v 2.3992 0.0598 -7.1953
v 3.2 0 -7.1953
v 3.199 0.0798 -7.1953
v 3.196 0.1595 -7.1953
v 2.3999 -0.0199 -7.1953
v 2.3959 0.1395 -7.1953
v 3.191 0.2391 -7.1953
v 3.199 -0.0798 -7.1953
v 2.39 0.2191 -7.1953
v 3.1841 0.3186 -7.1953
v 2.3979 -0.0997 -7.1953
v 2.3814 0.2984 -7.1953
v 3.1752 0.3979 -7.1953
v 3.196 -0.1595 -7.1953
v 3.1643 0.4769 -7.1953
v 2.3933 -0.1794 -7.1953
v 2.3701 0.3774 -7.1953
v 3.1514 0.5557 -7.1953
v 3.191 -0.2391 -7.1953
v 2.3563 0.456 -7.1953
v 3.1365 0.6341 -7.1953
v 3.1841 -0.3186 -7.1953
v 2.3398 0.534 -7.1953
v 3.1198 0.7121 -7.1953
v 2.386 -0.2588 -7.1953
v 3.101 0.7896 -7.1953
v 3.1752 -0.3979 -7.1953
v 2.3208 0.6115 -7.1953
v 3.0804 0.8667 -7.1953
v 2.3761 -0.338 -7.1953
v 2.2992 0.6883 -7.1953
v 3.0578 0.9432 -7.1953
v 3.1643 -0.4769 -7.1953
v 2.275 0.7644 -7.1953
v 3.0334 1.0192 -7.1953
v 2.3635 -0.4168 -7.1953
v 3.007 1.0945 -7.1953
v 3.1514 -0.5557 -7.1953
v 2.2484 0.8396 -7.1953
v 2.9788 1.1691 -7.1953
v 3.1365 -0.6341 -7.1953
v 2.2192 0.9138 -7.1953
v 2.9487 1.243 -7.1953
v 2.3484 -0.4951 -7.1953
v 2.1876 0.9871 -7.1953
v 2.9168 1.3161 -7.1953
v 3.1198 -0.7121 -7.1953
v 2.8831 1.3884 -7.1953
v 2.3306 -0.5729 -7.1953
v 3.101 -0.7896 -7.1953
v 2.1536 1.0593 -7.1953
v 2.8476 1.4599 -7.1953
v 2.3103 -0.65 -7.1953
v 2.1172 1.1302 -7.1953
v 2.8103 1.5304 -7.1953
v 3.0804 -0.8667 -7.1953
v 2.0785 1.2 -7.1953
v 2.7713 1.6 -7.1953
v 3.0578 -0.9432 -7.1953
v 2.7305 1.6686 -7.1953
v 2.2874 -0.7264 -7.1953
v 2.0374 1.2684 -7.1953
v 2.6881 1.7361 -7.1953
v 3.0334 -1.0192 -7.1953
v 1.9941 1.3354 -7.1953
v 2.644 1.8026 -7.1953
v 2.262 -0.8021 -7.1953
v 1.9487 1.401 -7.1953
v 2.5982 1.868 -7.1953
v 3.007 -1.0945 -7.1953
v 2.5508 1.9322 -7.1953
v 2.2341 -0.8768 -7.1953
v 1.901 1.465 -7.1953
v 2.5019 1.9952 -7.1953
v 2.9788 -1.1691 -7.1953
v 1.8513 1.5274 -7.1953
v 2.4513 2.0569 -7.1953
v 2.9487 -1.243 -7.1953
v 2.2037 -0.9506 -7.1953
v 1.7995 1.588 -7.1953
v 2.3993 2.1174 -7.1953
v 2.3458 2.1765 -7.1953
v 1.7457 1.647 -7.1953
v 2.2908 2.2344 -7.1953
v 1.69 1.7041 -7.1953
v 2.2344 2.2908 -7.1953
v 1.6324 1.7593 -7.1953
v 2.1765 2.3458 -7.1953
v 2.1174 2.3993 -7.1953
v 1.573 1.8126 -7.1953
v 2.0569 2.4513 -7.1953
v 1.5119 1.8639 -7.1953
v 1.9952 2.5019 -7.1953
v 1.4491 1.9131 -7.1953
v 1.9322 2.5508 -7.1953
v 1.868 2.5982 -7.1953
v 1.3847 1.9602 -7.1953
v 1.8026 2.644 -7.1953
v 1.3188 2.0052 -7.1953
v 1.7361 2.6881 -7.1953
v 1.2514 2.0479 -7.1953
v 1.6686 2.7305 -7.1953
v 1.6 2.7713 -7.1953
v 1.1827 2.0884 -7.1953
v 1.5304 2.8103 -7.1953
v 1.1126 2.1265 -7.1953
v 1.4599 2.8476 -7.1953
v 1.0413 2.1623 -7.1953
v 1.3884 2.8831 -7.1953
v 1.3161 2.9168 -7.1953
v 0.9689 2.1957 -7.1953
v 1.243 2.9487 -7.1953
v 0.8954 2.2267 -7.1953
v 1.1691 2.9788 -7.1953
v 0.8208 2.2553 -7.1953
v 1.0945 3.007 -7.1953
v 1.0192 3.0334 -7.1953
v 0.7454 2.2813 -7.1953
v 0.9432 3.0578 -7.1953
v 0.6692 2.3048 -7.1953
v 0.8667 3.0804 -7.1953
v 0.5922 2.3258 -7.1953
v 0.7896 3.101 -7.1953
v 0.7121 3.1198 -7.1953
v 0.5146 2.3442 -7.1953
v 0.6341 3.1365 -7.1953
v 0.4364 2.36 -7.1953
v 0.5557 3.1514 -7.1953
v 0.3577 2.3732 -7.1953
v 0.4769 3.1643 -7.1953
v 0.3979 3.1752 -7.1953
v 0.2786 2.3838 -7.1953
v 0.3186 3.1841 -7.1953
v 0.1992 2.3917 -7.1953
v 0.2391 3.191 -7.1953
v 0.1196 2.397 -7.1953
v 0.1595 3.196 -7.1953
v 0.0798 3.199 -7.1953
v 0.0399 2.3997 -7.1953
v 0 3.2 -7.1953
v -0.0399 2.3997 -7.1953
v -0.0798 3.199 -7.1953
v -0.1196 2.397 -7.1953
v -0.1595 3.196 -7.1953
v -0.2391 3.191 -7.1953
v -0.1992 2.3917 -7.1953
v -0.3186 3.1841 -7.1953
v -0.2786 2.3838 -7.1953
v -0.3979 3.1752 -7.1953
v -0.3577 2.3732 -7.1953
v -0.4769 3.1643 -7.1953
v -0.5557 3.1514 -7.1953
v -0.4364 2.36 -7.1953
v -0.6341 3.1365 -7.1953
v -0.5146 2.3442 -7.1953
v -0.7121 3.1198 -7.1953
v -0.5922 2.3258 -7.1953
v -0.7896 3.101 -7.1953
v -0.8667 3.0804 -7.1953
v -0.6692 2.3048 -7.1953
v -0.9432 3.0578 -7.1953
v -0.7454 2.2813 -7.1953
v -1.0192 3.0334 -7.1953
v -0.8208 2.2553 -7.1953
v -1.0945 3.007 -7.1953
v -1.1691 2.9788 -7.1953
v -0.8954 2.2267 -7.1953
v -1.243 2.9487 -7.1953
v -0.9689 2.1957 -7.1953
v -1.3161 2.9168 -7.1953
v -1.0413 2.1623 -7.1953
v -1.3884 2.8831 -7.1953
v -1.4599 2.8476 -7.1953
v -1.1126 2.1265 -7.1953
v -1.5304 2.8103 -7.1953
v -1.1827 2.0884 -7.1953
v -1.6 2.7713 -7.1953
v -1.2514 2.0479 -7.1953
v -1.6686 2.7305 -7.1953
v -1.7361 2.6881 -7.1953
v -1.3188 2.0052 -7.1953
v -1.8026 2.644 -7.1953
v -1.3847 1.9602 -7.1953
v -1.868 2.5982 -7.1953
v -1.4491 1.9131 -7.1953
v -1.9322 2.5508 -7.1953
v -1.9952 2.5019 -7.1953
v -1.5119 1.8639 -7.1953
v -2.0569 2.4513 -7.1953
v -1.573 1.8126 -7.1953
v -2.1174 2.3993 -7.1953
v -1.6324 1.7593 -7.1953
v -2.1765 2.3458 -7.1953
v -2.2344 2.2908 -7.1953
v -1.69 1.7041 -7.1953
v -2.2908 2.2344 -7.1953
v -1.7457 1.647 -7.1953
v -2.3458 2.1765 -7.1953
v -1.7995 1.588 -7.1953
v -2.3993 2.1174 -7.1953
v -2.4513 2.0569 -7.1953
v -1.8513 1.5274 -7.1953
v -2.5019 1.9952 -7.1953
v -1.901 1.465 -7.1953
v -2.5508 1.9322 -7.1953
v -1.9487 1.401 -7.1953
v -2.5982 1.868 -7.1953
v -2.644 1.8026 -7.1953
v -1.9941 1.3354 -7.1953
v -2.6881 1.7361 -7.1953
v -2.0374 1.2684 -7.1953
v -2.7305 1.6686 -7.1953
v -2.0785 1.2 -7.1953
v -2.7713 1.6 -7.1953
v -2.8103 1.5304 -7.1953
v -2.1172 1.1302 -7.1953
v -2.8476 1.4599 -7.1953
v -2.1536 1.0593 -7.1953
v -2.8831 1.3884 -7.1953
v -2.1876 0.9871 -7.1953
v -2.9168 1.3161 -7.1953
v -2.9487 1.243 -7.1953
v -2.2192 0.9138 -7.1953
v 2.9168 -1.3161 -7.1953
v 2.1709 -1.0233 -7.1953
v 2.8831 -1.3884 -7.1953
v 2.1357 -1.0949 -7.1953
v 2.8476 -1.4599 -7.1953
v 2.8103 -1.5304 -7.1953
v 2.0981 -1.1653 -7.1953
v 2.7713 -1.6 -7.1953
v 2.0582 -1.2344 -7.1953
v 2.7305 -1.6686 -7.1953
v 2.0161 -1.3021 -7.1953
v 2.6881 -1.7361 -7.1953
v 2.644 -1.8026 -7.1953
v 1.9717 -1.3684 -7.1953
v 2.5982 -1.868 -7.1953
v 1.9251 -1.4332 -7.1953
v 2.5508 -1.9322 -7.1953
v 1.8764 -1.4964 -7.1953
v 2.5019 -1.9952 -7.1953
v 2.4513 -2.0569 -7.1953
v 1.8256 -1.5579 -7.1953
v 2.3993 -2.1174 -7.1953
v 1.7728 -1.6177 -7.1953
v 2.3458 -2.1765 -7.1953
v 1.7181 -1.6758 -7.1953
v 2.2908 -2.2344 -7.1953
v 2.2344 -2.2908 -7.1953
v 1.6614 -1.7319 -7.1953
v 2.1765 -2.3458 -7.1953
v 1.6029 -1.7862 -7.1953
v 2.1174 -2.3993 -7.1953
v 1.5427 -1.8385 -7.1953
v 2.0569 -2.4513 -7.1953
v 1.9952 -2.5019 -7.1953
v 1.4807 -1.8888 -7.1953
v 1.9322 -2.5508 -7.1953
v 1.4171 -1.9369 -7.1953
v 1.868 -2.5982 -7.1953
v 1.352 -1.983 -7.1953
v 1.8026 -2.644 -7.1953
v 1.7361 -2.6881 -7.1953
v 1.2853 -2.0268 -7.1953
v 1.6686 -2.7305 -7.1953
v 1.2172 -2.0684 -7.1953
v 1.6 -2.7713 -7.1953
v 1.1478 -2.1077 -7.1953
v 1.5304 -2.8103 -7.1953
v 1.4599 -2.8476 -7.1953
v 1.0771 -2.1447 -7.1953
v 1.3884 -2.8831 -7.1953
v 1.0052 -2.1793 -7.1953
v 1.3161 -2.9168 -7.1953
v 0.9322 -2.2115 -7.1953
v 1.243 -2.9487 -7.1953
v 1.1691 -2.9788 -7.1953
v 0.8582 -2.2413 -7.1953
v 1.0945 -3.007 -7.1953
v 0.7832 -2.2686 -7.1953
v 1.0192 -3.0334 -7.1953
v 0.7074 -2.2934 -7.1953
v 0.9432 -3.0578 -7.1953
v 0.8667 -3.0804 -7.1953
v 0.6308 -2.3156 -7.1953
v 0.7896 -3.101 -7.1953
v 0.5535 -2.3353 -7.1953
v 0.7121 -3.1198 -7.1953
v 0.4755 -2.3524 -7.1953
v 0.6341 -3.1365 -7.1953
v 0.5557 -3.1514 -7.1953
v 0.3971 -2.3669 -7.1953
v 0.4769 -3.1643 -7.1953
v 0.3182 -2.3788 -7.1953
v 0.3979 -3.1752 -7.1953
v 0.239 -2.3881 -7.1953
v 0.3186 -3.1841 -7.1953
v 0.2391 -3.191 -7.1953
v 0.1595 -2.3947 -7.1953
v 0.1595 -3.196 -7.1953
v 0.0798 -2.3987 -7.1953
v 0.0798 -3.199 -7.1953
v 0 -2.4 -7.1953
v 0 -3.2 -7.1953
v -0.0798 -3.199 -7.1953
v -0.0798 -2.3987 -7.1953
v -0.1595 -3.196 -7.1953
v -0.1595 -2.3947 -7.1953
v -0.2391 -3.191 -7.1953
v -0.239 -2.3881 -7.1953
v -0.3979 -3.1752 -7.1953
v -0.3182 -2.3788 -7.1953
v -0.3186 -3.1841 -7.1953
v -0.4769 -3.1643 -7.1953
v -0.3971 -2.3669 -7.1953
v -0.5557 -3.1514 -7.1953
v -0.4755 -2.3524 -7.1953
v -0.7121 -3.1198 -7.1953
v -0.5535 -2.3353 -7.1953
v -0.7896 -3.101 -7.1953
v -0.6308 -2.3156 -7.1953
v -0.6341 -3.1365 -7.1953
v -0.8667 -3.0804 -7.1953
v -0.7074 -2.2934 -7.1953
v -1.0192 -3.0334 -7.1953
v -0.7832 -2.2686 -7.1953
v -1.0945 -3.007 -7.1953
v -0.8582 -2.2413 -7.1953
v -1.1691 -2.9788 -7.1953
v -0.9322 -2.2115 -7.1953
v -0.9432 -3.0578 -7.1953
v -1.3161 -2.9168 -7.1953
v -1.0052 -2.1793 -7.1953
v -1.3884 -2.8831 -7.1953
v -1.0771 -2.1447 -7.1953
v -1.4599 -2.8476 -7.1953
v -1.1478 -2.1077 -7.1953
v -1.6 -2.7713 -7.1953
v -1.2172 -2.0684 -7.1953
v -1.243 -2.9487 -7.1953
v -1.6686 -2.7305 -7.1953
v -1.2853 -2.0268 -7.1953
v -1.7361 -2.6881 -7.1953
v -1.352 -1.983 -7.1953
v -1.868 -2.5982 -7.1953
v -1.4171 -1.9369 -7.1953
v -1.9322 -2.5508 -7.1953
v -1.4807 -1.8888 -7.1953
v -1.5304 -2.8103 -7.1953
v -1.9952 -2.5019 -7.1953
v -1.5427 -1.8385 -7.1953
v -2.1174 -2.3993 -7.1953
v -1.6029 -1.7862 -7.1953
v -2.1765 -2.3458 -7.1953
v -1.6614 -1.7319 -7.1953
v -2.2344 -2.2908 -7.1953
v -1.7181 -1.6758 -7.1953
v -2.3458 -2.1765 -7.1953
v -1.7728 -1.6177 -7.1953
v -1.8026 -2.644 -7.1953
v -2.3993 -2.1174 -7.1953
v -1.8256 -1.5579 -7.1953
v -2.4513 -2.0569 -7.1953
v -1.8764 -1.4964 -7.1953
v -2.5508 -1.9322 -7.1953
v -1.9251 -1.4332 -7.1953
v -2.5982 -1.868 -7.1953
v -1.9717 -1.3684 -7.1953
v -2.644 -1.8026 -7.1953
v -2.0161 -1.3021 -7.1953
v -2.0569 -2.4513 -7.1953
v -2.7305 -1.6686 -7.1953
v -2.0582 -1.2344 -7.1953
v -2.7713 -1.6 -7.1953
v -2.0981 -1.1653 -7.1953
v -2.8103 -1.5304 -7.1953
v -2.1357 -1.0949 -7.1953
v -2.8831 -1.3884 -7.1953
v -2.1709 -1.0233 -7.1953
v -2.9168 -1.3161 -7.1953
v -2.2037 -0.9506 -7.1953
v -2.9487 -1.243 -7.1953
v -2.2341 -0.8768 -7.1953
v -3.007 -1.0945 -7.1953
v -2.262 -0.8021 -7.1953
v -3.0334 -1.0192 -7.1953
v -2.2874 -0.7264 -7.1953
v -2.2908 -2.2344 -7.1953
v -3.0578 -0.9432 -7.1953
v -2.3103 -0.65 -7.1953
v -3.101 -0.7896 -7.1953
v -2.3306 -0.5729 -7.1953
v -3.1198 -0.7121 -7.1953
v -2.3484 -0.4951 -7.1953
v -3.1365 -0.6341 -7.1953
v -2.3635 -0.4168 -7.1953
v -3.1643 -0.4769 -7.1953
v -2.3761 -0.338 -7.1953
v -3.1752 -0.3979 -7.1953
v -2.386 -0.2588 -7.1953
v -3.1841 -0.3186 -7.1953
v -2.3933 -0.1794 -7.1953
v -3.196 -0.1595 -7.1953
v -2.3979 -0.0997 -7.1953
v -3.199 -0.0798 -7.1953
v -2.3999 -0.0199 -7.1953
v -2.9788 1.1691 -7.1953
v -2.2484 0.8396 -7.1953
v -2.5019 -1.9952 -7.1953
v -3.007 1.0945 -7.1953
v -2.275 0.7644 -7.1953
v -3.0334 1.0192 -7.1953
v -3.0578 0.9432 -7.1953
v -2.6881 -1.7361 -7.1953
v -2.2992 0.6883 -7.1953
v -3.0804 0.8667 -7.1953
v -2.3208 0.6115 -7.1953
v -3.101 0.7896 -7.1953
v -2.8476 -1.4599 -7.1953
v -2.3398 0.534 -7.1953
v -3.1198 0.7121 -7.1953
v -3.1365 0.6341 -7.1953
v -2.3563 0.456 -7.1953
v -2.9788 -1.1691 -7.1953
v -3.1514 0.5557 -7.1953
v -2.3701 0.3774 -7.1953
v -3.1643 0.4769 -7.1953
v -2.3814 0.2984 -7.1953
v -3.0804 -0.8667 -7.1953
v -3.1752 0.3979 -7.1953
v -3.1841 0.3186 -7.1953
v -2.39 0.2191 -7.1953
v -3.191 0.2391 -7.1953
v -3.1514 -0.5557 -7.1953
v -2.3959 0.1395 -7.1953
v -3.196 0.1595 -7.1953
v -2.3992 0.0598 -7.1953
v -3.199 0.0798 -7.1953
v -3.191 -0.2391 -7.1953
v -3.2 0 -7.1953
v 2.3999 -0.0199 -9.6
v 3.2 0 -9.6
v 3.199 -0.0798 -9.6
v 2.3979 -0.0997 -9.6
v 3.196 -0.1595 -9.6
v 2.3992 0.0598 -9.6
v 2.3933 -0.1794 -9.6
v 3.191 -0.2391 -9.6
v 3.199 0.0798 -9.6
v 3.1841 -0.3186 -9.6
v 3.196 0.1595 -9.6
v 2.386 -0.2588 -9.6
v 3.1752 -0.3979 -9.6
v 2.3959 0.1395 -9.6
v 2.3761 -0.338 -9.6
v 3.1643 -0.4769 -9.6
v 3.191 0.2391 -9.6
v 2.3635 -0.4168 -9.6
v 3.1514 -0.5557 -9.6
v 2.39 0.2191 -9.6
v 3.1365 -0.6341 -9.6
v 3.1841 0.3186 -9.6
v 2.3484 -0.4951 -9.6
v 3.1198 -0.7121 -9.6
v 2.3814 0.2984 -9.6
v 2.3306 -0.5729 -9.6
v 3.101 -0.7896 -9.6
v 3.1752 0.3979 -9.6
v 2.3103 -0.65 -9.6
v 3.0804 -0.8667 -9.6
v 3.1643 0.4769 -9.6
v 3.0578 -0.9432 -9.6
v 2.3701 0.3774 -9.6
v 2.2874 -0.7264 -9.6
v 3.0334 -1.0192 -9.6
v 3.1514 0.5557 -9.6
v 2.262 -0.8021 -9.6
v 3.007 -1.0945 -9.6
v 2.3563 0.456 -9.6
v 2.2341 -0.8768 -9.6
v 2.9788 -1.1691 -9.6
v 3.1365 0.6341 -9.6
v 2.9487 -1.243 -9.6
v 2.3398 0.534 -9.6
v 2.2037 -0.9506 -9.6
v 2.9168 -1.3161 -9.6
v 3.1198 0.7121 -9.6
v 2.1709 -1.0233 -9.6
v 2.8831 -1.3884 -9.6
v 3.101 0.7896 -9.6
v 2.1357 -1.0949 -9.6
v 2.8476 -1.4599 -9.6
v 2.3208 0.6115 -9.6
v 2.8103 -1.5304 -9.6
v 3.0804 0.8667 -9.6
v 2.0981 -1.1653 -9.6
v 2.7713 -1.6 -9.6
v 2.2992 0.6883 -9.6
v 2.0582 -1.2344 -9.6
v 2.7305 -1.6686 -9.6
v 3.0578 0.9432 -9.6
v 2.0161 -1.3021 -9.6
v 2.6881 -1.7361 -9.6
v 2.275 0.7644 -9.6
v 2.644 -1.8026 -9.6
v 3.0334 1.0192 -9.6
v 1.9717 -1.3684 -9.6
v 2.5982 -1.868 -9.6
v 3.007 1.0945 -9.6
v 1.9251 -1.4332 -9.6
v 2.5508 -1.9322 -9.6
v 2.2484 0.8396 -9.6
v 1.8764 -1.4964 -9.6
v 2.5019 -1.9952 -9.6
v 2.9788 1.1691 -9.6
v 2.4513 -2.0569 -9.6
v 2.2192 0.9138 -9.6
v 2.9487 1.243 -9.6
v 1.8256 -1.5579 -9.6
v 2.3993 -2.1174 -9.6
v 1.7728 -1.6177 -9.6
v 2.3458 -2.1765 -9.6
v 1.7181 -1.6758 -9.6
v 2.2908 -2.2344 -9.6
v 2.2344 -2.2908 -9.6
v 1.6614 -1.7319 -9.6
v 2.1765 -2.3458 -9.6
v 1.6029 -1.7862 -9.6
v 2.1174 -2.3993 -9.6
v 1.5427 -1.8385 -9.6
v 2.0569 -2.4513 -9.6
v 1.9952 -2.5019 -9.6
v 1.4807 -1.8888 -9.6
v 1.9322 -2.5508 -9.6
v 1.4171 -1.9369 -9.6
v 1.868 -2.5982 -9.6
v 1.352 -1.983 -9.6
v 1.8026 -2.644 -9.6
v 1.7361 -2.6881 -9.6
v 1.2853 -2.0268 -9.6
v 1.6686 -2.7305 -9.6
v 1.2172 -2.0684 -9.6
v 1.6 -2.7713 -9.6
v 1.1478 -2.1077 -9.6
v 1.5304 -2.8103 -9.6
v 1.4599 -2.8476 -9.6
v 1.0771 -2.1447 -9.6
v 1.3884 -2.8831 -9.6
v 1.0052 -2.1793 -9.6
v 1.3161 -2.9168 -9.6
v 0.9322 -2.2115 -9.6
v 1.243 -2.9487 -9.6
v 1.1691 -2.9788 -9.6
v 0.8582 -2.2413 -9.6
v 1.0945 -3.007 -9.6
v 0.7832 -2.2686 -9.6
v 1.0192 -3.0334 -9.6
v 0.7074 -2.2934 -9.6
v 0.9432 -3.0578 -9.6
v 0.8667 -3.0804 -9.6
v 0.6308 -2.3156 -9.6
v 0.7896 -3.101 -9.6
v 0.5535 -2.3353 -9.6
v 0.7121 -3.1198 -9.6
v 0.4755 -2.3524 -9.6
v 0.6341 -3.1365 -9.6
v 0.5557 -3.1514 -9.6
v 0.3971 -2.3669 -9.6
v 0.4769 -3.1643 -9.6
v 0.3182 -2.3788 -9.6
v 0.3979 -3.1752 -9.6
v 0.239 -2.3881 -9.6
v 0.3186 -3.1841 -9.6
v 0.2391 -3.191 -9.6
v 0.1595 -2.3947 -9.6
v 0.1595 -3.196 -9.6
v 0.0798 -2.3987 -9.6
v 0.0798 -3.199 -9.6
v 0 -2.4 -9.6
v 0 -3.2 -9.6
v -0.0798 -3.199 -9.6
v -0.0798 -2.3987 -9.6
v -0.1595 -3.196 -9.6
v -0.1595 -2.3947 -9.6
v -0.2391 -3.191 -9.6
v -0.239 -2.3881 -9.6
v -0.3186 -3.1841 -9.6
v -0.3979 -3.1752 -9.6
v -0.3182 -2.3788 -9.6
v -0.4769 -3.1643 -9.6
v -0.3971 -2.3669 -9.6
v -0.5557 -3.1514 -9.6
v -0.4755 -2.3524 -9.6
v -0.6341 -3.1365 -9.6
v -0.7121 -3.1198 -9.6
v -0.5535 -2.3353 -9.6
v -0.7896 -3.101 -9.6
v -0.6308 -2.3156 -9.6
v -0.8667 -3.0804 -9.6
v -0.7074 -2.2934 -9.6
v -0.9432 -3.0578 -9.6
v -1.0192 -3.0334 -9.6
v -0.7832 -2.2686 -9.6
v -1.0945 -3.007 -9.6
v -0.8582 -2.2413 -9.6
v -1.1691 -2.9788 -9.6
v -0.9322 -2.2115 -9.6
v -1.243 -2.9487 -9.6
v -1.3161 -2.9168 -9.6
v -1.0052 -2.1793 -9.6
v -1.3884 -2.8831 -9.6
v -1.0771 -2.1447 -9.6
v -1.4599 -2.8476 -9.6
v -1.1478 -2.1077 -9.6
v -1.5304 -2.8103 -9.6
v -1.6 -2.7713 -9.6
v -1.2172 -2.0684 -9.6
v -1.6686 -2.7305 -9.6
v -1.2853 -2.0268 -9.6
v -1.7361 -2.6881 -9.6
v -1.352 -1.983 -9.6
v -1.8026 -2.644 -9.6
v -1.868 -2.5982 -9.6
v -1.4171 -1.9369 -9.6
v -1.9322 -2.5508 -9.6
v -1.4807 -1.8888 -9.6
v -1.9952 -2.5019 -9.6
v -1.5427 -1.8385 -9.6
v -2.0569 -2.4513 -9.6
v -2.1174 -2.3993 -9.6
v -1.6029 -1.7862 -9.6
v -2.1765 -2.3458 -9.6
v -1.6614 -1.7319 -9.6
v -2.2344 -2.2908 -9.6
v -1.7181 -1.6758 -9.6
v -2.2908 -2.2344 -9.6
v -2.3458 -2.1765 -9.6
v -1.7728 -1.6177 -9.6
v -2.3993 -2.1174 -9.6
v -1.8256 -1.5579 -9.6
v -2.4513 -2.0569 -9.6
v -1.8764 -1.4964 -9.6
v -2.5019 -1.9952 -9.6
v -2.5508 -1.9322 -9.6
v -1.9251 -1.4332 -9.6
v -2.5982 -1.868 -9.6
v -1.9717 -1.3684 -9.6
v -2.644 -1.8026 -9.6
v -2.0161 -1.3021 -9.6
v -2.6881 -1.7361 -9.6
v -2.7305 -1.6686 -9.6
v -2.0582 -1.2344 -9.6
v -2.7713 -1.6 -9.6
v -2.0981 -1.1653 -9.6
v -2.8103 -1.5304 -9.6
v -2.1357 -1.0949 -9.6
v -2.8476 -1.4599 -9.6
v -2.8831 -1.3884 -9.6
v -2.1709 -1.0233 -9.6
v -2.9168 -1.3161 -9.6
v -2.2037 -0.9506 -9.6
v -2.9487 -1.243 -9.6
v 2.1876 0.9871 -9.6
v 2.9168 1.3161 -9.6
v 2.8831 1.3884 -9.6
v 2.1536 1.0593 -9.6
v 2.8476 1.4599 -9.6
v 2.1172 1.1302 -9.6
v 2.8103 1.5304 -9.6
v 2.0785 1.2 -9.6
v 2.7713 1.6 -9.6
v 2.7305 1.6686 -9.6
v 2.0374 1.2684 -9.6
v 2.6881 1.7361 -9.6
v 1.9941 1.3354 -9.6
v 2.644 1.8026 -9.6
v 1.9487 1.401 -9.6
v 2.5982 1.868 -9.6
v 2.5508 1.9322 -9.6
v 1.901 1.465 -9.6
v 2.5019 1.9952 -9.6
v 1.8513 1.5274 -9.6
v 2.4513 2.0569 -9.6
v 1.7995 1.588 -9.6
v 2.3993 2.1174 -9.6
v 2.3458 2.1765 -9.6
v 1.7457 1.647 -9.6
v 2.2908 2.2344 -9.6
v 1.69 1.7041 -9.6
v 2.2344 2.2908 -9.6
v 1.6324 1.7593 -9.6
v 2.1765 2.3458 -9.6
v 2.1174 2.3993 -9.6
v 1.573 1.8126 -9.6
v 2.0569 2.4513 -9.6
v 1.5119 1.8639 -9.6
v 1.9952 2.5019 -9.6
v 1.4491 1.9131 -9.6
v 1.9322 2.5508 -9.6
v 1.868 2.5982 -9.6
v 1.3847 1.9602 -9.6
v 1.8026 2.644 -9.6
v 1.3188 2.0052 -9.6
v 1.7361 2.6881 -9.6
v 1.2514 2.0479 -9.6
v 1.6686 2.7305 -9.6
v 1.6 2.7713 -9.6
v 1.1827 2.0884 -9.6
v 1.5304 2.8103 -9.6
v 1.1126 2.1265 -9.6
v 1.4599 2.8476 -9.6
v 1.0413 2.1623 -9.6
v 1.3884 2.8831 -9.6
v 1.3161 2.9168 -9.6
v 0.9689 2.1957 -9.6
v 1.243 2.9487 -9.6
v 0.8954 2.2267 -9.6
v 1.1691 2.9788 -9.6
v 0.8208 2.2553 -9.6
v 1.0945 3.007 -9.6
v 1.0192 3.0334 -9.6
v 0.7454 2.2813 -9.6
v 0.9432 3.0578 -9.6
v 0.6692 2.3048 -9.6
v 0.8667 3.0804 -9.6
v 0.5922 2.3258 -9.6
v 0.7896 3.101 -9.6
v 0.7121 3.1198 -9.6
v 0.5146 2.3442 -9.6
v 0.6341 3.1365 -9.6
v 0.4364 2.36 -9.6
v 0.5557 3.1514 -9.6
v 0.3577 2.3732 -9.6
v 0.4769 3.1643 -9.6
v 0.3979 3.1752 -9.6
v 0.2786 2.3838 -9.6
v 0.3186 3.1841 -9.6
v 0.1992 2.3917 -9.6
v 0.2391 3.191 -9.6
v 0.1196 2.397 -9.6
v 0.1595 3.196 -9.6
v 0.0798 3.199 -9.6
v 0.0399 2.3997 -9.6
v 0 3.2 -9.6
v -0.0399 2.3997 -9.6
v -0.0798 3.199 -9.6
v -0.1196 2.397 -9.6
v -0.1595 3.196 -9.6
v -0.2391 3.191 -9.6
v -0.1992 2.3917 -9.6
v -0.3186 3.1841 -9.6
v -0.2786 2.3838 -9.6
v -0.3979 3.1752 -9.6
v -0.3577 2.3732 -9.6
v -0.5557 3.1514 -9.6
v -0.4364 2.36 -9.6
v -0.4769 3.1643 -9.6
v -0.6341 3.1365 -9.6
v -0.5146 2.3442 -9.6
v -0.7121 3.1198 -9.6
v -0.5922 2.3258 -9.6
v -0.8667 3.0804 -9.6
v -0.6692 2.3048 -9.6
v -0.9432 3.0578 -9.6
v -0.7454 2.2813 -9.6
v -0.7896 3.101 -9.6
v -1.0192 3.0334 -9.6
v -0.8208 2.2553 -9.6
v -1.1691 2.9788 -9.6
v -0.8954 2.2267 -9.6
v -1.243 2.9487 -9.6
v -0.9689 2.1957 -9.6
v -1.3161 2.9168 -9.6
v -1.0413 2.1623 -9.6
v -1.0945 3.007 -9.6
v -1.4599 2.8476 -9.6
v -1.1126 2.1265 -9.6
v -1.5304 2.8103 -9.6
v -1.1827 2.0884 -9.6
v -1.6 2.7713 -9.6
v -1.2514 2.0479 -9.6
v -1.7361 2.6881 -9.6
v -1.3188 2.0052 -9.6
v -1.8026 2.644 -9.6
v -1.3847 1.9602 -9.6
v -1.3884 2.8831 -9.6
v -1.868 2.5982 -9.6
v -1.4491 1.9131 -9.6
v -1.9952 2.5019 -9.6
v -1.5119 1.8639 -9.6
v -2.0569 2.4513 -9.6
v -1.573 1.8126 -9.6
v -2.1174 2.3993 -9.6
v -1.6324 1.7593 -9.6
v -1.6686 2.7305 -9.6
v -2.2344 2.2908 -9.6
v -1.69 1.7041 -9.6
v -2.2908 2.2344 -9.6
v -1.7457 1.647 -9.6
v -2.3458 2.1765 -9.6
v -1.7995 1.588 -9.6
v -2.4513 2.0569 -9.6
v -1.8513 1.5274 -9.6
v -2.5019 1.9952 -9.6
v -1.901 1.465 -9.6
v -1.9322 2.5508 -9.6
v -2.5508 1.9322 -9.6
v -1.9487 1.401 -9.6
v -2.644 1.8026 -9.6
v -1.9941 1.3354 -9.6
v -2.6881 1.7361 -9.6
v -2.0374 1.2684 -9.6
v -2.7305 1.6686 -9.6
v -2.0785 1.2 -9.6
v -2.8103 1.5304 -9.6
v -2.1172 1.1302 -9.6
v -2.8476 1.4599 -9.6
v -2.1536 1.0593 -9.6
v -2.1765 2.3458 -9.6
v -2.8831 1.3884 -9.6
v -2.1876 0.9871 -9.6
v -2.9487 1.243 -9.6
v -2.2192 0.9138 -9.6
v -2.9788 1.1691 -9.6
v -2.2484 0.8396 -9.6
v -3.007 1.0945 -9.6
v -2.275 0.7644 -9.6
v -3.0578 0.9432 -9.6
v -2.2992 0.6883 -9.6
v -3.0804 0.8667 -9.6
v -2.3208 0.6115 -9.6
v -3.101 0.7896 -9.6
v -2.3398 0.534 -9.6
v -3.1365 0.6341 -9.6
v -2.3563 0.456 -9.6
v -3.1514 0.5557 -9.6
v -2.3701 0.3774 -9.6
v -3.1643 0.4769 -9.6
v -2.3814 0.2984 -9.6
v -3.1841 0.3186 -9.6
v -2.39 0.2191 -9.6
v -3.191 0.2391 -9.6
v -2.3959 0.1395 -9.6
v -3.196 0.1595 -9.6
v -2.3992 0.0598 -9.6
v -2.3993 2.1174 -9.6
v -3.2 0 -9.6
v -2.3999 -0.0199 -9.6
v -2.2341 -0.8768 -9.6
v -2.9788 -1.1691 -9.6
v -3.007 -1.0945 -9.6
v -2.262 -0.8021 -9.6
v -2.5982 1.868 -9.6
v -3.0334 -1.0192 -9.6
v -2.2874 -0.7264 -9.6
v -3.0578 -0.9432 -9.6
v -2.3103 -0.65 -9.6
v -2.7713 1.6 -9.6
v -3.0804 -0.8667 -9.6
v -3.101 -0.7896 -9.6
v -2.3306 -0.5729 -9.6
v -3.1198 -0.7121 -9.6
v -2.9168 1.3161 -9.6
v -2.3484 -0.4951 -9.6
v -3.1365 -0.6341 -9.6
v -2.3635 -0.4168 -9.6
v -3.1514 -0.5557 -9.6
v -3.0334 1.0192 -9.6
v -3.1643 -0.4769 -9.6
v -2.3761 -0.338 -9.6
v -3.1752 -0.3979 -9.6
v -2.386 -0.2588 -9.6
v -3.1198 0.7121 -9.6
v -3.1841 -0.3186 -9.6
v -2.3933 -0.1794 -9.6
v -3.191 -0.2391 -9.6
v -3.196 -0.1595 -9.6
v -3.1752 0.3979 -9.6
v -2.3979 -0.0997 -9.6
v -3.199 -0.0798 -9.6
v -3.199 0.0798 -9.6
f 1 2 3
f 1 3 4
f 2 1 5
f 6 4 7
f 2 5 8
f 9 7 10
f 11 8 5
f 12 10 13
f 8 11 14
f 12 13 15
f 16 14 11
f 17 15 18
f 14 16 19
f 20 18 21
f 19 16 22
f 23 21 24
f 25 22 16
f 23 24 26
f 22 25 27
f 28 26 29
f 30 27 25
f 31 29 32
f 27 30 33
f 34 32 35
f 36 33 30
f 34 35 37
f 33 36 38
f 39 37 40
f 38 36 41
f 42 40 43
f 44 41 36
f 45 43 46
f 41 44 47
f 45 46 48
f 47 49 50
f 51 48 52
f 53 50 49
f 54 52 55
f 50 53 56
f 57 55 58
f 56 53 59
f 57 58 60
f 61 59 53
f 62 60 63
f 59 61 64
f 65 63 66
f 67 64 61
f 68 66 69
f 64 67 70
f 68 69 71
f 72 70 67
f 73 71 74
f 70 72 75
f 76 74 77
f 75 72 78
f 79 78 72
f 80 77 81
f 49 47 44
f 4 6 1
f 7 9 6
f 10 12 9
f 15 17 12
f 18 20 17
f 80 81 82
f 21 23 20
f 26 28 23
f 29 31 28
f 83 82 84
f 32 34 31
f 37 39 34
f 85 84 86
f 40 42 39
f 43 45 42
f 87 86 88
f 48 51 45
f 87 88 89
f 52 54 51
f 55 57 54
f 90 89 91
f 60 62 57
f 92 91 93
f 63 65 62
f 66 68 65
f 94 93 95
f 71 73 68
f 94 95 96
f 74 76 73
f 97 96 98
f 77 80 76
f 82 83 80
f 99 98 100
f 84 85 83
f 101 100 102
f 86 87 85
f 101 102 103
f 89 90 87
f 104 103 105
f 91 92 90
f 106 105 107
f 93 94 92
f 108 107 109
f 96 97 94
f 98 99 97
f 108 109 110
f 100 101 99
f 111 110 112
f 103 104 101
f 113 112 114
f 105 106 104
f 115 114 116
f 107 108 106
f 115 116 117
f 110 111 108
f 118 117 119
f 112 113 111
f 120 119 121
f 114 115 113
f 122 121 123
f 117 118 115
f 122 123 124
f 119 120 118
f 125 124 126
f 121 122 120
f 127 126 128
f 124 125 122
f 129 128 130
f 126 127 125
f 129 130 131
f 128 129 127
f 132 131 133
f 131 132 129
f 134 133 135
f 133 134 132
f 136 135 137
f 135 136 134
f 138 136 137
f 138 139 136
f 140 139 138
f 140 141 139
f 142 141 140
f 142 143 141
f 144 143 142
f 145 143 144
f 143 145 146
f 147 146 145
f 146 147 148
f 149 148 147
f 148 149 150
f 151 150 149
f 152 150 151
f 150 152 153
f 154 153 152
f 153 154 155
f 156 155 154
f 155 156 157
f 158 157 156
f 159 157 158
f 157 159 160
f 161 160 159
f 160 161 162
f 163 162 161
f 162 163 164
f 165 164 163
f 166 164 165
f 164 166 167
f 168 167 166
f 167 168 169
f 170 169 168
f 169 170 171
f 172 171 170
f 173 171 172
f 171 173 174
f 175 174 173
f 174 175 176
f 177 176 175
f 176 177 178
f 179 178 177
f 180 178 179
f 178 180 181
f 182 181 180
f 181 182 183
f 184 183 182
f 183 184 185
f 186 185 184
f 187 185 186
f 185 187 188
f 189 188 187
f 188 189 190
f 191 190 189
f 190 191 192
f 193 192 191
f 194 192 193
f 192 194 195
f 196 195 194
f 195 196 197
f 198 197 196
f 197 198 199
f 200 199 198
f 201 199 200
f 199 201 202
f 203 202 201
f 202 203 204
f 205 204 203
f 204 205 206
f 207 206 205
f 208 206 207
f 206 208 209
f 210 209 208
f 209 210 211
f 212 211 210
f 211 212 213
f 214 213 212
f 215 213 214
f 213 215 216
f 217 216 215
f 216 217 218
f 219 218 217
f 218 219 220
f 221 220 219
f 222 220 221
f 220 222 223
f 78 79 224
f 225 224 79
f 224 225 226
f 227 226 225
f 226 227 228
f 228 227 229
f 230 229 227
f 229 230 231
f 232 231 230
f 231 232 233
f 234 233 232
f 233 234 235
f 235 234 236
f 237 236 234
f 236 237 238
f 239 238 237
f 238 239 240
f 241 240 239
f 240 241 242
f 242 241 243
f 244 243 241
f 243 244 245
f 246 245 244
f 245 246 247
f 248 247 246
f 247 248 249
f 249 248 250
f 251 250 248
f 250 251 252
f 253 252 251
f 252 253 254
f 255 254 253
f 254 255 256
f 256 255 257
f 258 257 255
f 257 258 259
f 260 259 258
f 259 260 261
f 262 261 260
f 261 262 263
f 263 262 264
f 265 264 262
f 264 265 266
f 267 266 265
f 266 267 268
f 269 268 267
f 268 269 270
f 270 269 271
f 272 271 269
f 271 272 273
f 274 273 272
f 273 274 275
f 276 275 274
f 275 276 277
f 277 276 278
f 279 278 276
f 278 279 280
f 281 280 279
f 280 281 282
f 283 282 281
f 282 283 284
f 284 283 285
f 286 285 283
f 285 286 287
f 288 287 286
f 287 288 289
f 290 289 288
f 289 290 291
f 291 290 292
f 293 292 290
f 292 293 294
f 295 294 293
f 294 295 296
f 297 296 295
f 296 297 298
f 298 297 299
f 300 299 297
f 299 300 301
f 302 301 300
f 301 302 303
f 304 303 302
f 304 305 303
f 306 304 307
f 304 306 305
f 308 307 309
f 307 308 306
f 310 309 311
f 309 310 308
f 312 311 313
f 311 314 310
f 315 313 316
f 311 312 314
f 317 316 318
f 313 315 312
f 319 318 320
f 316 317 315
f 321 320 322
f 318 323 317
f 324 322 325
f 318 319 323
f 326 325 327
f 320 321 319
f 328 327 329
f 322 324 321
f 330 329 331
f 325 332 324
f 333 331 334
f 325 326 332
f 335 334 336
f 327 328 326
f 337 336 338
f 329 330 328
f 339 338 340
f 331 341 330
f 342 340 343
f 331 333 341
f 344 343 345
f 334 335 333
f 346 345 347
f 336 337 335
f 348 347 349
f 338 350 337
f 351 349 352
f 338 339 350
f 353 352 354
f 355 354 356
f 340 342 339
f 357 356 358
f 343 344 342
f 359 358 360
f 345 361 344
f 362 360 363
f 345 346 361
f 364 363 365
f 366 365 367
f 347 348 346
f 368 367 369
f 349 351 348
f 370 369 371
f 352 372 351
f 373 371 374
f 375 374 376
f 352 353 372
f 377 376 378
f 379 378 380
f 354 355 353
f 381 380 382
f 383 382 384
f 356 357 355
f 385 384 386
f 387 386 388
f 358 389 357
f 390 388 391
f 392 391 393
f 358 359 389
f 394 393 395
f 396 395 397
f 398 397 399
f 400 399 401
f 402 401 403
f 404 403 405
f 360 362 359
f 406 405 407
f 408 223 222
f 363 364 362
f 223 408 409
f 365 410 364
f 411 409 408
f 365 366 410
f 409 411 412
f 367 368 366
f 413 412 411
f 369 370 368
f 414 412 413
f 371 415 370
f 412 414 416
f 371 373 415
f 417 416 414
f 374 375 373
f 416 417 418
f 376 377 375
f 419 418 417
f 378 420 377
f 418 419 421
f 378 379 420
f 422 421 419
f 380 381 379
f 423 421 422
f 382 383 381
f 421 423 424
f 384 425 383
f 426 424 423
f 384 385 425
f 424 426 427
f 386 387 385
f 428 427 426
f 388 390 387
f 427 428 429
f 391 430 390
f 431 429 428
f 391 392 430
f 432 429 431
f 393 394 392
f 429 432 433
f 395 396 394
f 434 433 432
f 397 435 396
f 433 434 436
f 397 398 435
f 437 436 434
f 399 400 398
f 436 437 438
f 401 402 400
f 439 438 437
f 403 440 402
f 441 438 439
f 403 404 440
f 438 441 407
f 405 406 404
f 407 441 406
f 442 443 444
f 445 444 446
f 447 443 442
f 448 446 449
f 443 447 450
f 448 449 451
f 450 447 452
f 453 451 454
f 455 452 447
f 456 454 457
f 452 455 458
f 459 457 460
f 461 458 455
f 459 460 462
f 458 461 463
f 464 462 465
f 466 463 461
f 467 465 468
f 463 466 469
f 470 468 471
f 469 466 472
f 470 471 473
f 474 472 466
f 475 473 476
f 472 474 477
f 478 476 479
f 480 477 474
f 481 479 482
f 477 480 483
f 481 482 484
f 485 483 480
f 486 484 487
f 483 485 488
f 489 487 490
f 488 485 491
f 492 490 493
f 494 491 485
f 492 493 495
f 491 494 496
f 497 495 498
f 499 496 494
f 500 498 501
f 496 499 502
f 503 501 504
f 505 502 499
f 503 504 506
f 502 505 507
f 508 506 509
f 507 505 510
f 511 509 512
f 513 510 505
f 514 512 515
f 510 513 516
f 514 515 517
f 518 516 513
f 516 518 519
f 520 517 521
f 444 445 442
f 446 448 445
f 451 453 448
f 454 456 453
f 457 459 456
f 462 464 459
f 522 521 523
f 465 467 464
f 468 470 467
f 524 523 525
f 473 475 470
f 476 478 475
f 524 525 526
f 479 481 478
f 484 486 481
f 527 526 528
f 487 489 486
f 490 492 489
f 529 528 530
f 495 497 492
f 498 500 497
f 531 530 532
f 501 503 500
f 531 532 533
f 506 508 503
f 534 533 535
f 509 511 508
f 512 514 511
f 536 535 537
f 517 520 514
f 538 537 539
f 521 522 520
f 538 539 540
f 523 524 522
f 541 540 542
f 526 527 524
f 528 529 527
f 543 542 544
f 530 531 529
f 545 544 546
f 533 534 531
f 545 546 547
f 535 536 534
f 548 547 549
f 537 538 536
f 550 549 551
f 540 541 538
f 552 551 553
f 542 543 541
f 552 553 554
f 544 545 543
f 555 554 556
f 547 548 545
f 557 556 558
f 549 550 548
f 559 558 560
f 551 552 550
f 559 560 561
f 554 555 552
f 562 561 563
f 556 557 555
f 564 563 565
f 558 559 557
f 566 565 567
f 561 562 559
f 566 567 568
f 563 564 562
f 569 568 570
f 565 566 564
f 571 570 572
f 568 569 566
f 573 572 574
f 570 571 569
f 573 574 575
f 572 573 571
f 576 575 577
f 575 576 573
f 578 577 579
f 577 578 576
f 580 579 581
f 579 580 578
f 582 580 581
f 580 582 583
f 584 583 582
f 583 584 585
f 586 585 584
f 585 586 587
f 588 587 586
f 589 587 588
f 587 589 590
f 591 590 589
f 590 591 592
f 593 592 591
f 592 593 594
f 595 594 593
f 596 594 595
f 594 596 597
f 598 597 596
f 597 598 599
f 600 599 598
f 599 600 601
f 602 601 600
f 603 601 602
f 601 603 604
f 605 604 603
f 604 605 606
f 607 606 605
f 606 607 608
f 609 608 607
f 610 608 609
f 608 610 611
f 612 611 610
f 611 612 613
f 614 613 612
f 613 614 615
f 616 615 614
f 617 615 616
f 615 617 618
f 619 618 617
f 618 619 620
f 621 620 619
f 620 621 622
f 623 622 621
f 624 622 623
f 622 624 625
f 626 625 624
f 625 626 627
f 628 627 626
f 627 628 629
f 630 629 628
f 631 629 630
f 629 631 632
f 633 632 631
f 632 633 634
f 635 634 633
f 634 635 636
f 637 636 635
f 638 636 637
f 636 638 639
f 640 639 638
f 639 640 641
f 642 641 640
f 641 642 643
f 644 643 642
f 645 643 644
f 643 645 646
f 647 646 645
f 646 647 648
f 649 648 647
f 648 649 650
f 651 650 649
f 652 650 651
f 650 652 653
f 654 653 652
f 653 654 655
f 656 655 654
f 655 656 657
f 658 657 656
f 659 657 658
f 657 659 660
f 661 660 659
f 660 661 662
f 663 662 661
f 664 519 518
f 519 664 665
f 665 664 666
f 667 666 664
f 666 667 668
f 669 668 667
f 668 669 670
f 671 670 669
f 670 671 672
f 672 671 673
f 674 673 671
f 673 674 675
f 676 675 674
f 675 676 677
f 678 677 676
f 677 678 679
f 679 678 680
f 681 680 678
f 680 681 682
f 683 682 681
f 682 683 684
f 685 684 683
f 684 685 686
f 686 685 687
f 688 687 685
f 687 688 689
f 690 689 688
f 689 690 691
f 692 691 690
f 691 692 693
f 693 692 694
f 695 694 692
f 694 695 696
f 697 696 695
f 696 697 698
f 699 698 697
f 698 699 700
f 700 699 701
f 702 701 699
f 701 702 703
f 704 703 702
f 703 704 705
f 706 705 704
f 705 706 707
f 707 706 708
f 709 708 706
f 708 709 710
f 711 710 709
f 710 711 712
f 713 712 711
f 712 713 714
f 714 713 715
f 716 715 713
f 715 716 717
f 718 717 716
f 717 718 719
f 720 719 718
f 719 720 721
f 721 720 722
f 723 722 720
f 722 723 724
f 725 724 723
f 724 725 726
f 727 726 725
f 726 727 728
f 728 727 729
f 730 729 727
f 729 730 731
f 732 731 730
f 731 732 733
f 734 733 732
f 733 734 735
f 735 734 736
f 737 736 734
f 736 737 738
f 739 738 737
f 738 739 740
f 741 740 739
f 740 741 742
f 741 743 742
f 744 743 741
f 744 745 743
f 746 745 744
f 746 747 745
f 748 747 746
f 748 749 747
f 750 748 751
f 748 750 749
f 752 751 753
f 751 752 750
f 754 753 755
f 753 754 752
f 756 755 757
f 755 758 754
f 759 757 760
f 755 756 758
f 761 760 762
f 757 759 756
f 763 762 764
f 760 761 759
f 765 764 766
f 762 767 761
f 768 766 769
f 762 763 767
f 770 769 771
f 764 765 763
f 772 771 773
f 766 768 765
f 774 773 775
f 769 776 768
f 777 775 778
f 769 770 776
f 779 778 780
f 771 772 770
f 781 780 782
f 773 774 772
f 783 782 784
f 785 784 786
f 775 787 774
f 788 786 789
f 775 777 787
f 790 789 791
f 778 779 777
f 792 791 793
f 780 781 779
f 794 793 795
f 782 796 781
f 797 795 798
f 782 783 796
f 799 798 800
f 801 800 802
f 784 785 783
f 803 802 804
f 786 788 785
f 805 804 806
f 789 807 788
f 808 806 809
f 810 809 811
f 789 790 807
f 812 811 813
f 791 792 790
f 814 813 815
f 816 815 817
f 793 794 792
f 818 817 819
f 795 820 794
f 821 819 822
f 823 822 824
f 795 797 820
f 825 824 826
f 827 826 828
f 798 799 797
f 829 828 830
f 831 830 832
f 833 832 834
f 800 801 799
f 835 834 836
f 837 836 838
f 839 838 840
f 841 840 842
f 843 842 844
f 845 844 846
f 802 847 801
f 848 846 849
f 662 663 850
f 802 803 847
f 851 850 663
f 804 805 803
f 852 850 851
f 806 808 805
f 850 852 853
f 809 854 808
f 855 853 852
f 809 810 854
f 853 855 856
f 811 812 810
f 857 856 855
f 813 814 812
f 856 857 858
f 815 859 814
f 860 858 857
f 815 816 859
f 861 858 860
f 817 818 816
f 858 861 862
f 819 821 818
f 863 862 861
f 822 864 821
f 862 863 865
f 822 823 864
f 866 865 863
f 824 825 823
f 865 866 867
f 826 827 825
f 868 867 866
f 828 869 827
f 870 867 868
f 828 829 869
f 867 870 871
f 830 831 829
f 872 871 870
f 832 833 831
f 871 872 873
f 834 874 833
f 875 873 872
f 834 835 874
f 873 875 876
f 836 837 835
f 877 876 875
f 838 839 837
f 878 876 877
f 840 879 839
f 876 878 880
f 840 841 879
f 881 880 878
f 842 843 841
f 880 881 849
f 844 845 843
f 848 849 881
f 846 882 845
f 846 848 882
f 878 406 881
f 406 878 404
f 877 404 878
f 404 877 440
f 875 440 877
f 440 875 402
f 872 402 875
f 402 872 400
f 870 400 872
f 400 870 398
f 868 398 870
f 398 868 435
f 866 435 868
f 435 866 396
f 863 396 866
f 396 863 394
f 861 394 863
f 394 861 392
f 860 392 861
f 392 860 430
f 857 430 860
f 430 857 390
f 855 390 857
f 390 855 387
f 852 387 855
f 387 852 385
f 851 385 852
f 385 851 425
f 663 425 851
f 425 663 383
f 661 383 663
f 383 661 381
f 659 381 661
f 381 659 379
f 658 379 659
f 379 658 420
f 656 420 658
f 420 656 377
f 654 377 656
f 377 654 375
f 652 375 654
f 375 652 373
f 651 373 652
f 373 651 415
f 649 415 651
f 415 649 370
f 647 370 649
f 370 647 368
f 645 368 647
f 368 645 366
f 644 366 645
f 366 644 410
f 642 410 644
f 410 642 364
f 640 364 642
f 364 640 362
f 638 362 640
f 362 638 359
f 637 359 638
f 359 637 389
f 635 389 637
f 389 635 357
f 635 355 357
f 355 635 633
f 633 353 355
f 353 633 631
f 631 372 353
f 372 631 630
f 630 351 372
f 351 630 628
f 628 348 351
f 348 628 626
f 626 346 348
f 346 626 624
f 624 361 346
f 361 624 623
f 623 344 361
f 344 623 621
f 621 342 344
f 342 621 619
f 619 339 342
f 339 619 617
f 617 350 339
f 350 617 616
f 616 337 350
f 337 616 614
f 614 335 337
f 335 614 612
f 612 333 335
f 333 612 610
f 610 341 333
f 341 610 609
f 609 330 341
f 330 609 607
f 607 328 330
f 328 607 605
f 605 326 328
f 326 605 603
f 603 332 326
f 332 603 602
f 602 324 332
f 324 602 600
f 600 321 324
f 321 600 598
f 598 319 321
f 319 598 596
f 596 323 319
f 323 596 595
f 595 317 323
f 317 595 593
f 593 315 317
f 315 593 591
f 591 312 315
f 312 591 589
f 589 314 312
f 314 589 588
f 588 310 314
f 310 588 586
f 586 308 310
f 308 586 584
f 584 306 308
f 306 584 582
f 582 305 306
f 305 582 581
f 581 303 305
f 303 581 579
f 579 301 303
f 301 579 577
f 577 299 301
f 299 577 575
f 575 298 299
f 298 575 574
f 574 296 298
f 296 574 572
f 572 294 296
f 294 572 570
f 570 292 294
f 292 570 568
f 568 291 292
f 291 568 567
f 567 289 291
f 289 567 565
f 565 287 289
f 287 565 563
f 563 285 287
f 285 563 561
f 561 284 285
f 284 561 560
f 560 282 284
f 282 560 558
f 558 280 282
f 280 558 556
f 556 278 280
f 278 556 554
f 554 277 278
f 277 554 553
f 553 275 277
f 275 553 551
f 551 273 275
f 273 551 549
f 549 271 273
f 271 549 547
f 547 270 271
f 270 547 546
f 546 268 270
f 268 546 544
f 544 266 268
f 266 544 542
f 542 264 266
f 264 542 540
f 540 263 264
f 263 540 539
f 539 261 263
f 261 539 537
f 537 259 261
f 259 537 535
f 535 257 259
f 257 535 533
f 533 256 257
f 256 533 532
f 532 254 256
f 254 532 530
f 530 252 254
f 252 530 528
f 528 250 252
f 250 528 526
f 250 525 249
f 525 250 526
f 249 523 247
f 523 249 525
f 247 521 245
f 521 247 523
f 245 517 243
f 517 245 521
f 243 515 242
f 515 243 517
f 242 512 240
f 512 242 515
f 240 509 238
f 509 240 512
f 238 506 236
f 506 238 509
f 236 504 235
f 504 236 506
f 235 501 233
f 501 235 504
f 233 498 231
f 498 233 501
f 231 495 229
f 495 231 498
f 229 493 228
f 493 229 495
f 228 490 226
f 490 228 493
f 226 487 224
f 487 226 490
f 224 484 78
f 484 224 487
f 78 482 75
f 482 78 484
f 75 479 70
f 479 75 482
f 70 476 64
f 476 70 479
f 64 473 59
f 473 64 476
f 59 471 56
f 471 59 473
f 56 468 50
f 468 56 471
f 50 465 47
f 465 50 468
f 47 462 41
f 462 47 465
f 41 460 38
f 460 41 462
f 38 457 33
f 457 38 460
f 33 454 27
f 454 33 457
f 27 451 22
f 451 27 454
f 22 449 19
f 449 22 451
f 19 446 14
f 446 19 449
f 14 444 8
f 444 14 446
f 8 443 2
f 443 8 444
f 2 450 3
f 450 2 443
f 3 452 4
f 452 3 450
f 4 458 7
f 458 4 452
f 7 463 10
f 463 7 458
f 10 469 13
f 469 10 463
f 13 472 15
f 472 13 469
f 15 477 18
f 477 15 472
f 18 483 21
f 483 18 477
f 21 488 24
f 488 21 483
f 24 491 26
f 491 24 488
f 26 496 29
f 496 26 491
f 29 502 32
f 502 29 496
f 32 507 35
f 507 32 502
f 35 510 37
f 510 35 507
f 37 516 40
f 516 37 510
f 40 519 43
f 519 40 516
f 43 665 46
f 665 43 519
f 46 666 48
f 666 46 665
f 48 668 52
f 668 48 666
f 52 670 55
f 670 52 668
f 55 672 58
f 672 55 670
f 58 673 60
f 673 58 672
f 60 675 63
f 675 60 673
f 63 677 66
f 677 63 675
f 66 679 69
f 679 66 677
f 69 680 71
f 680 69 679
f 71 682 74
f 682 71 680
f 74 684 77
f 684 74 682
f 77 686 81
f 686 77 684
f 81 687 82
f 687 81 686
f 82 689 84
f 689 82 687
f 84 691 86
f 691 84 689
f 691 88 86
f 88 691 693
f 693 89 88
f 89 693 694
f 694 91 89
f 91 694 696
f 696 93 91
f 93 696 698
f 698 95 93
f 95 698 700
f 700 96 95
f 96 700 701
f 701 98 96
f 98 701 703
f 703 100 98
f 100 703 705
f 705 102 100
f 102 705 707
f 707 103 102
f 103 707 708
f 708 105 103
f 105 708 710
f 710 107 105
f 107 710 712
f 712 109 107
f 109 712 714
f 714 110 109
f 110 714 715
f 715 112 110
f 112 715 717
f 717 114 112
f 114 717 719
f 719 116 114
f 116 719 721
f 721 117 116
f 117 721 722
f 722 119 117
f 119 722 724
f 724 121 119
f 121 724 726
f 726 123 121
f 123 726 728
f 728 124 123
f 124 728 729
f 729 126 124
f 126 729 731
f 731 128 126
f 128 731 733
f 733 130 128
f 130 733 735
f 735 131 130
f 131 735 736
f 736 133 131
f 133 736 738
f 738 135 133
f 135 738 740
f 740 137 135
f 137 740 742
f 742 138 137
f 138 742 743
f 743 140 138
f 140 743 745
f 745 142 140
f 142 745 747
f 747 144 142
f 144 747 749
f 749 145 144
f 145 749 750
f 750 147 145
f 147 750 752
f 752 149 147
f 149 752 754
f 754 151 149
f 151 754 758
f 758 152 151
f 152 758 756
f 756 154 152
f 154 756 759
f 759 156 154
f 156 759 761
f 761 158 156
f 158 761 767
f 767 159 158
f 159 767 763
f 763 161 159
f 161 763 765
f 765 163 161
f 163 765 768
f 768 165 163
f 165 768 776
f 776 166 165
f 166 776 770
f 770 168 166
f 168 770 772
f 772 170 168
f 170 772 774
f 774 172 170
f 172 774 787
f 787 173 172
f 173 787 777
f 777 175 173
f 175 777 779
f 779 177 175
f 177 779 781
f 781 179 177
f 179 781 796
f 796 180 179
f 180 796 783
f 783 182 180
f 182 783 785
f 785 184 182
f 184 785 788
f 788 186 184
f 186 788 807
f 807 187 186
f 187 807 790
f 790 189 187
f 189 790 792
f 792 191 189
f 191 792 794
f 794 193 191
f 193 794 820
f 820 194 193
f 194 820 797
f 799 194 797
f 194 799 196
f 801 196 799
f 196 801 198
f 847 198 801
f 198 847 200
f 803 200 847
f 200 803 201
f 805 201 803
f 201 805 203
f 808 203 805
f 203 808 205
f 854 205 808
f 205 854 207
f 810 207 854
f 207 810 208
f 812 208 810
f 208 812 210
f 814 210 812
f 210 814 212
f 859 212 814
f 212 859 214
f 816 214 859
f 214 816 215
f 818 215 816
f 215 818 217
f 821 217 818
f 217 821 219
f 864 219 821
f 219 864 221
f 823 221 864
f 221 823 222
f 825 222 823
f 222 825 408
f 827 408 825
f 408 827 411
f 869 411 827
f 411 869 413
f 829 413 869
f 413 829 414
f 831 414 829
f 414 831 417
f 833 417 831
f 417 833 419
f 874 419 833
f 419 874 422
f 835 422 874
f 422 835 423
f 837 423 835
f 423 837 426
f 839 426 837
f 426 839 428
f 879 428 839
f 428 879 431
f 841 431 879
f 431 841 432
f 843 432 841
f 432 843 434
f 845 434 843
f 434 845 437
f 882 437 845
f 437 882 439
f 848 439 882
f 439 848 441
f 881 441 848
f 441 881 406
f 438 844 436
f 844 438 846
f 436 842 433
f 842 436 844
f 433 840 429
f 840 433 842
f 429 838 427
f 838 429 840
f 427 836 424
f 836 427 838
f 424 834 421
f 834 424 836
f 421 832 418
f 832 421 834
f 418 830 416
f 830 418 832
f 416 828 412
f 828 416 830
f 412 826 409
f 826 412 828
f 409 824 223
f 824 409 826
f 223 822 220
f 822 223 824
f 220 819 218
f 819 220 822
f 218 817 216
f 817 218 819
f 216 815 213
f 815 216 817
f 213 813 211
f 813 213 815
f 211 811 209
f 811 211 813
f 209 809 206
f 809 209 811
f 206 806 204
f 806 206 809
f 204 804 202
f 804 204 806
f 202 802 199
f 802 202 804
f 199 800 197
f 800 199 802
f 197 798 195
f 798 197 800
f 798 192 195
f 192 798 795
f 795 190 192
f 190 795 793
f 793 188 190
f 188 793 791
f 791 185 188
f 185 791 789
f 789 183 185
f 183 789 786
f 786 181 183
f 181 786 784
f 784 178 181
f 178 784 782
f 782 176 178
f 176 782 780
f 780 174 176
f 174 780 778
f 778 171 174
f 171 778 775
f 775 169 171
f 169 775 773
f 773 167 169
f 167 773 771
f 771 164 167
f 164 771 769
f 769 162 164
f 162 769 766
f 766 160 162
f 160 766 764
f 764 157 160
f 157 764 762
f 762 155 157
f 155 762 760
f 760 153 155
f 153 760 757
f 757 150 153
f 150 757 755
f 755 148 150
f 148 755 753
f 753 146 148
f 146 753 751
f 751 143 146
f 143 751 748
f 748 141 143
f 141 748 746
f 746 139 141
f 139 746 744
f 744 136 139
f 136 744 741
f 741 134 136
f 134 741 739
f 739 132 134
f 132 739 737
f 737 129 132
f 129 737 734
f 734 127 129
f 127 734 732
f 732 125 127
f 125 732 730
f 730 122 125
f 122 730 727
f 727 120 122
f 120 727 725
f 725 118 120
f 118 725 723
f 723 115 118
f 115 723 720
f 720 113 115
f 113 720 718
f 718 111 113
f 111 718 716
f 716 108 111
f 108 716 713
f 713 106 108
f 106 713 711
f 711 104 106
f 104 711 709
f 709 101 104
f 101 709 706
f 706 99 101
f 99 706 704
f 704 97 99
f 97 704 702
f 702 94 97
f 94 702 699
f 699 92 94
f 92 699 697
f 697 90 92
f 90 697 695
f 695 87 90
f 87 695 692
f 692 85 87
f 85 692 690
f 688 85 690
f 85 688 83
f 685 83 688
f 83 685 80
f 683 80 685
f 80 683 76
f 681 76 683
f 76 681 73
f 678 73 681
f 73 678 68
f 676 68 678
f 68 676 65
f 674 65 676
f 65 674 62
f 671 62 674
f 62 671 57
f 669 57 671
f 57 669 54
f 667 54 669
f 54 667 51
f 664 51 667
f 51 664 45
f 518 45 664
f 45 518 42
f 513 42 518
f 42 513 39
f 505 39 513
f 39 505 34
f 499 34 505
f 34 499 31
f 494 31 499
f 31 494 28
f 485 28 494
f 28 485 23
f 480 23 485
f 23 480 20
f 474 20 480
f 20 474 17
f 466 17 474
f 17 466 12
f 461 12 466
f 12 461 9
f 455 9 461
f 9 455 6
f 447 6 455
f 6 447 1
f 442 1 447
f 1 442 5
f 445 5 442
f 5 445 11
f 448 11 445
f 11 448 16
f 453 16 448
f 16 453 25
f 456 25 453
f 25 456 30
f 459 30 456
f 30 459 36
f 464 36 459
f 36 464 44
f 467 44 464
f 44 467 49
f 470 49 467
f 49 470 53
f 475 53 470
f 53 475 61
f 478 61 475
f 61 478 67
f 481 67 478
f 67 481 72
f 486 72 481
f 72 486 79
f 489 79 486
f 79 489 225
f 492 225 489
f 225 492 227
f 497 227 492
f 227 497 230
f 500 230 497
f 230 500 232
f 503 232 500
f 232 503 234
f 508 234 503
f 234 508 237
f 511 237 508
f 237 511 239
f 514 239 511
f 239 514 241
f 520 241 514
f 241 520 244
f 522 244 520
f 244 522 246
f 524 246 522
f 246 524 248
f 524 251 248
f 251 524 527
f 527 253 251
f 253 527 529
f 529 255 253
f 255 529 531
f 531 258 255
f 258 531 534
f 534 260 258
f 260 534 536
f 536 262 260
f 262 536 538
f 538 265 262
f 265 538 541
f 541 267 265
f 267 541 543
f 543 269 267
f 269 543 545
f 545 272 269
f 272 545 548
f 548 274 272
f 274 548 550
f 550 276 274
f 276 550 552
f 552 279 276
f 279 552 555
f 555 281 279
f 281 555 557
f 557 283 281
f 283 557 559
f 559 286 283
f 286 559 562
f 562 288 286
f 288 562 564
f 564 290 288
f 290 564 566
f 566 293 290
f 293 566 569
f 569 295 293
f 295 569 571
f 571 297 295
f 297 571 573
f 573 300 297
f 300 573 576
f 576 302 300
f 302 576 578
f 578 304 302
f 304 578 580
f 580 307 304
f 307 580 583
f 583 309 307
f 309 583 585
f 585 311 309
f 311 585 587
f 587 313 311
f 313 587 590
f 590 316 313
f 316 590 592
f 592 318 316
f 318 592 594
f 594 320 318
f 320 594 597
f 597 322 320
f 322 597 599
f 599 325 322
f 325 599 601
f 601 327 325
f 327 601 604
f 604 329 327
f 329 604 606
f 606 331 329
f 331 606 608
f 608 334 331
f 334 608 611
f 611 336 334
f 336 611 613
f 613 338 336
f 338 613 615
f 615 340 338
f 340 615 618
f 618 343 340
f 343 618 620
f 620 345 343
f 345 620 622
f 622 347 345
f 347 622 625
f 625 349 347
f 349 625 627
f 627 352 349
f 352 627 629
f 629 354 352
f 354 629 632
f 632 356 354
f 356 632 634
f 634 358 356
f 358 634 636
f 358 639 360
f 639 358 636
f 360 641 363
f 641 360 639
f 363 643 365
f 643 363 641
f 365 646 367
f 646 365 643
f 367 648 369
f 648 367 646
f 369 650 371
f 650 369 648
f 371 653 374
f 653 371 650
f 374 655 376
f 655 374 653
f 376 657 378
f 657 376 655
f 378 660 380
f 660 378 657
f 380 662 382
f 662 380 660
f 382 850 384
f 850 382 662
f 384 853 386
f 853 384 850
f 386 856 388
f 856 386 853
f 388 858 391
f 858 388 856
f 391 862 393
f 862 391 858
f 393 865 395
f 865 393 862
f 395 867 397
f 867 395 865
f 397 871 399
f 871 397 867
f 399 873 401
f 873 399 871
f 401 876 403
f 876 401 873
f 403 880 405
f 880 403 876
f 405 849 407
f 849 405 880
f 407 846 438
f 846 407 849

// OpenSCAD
use <../lib.scad>
use <3899.scad>
$fa=1; $fs=0.2;
function ldraw_lib__150(realsolid=false) = [
// 0 ~Moved to 3899
// 0 Name: 150.dat
// 0 Author: [PTadmin]
// 0 !LDRAW_ORG Part UPDATE 1998-06
// 0 !LICENSE Licensed under CC BY 4.0 : see CAreadme.txt
// 
// 0 BFC CERTIFY CCW
  [0,"BFC","CERTIFY"],
  [0,"BFC","CCW"],
// 
// 0 !HISTORY 1998-06-20 [PTadmin] Official Update 1998-06
// 0 !HISTORY 2007-05-08 [PTadmin] Header formatted for Contributor Agreement
// 0 !HISTORY 2008-07-01 [PTadmin] Official Update 2008-01
// 
// 
// 1 16 0 0 0 1 0 0 0 1 0 0 0 1 3899.dat
  [1,16,0,0,0,1,0,0,0,1,0,0,0,1, ldraw_lib__3899(realsolid)],
];
module ldraw_lib__150(step=0, col=false, unit=2/5, alt=false, line=0.2, solid=!$preview)
    makepoly(ldraw_lib__150(solid), step=step, col=col, unit=unit, alt=alt, line=line, solid=solid);
ldraw_lib__150(line=0.2);
